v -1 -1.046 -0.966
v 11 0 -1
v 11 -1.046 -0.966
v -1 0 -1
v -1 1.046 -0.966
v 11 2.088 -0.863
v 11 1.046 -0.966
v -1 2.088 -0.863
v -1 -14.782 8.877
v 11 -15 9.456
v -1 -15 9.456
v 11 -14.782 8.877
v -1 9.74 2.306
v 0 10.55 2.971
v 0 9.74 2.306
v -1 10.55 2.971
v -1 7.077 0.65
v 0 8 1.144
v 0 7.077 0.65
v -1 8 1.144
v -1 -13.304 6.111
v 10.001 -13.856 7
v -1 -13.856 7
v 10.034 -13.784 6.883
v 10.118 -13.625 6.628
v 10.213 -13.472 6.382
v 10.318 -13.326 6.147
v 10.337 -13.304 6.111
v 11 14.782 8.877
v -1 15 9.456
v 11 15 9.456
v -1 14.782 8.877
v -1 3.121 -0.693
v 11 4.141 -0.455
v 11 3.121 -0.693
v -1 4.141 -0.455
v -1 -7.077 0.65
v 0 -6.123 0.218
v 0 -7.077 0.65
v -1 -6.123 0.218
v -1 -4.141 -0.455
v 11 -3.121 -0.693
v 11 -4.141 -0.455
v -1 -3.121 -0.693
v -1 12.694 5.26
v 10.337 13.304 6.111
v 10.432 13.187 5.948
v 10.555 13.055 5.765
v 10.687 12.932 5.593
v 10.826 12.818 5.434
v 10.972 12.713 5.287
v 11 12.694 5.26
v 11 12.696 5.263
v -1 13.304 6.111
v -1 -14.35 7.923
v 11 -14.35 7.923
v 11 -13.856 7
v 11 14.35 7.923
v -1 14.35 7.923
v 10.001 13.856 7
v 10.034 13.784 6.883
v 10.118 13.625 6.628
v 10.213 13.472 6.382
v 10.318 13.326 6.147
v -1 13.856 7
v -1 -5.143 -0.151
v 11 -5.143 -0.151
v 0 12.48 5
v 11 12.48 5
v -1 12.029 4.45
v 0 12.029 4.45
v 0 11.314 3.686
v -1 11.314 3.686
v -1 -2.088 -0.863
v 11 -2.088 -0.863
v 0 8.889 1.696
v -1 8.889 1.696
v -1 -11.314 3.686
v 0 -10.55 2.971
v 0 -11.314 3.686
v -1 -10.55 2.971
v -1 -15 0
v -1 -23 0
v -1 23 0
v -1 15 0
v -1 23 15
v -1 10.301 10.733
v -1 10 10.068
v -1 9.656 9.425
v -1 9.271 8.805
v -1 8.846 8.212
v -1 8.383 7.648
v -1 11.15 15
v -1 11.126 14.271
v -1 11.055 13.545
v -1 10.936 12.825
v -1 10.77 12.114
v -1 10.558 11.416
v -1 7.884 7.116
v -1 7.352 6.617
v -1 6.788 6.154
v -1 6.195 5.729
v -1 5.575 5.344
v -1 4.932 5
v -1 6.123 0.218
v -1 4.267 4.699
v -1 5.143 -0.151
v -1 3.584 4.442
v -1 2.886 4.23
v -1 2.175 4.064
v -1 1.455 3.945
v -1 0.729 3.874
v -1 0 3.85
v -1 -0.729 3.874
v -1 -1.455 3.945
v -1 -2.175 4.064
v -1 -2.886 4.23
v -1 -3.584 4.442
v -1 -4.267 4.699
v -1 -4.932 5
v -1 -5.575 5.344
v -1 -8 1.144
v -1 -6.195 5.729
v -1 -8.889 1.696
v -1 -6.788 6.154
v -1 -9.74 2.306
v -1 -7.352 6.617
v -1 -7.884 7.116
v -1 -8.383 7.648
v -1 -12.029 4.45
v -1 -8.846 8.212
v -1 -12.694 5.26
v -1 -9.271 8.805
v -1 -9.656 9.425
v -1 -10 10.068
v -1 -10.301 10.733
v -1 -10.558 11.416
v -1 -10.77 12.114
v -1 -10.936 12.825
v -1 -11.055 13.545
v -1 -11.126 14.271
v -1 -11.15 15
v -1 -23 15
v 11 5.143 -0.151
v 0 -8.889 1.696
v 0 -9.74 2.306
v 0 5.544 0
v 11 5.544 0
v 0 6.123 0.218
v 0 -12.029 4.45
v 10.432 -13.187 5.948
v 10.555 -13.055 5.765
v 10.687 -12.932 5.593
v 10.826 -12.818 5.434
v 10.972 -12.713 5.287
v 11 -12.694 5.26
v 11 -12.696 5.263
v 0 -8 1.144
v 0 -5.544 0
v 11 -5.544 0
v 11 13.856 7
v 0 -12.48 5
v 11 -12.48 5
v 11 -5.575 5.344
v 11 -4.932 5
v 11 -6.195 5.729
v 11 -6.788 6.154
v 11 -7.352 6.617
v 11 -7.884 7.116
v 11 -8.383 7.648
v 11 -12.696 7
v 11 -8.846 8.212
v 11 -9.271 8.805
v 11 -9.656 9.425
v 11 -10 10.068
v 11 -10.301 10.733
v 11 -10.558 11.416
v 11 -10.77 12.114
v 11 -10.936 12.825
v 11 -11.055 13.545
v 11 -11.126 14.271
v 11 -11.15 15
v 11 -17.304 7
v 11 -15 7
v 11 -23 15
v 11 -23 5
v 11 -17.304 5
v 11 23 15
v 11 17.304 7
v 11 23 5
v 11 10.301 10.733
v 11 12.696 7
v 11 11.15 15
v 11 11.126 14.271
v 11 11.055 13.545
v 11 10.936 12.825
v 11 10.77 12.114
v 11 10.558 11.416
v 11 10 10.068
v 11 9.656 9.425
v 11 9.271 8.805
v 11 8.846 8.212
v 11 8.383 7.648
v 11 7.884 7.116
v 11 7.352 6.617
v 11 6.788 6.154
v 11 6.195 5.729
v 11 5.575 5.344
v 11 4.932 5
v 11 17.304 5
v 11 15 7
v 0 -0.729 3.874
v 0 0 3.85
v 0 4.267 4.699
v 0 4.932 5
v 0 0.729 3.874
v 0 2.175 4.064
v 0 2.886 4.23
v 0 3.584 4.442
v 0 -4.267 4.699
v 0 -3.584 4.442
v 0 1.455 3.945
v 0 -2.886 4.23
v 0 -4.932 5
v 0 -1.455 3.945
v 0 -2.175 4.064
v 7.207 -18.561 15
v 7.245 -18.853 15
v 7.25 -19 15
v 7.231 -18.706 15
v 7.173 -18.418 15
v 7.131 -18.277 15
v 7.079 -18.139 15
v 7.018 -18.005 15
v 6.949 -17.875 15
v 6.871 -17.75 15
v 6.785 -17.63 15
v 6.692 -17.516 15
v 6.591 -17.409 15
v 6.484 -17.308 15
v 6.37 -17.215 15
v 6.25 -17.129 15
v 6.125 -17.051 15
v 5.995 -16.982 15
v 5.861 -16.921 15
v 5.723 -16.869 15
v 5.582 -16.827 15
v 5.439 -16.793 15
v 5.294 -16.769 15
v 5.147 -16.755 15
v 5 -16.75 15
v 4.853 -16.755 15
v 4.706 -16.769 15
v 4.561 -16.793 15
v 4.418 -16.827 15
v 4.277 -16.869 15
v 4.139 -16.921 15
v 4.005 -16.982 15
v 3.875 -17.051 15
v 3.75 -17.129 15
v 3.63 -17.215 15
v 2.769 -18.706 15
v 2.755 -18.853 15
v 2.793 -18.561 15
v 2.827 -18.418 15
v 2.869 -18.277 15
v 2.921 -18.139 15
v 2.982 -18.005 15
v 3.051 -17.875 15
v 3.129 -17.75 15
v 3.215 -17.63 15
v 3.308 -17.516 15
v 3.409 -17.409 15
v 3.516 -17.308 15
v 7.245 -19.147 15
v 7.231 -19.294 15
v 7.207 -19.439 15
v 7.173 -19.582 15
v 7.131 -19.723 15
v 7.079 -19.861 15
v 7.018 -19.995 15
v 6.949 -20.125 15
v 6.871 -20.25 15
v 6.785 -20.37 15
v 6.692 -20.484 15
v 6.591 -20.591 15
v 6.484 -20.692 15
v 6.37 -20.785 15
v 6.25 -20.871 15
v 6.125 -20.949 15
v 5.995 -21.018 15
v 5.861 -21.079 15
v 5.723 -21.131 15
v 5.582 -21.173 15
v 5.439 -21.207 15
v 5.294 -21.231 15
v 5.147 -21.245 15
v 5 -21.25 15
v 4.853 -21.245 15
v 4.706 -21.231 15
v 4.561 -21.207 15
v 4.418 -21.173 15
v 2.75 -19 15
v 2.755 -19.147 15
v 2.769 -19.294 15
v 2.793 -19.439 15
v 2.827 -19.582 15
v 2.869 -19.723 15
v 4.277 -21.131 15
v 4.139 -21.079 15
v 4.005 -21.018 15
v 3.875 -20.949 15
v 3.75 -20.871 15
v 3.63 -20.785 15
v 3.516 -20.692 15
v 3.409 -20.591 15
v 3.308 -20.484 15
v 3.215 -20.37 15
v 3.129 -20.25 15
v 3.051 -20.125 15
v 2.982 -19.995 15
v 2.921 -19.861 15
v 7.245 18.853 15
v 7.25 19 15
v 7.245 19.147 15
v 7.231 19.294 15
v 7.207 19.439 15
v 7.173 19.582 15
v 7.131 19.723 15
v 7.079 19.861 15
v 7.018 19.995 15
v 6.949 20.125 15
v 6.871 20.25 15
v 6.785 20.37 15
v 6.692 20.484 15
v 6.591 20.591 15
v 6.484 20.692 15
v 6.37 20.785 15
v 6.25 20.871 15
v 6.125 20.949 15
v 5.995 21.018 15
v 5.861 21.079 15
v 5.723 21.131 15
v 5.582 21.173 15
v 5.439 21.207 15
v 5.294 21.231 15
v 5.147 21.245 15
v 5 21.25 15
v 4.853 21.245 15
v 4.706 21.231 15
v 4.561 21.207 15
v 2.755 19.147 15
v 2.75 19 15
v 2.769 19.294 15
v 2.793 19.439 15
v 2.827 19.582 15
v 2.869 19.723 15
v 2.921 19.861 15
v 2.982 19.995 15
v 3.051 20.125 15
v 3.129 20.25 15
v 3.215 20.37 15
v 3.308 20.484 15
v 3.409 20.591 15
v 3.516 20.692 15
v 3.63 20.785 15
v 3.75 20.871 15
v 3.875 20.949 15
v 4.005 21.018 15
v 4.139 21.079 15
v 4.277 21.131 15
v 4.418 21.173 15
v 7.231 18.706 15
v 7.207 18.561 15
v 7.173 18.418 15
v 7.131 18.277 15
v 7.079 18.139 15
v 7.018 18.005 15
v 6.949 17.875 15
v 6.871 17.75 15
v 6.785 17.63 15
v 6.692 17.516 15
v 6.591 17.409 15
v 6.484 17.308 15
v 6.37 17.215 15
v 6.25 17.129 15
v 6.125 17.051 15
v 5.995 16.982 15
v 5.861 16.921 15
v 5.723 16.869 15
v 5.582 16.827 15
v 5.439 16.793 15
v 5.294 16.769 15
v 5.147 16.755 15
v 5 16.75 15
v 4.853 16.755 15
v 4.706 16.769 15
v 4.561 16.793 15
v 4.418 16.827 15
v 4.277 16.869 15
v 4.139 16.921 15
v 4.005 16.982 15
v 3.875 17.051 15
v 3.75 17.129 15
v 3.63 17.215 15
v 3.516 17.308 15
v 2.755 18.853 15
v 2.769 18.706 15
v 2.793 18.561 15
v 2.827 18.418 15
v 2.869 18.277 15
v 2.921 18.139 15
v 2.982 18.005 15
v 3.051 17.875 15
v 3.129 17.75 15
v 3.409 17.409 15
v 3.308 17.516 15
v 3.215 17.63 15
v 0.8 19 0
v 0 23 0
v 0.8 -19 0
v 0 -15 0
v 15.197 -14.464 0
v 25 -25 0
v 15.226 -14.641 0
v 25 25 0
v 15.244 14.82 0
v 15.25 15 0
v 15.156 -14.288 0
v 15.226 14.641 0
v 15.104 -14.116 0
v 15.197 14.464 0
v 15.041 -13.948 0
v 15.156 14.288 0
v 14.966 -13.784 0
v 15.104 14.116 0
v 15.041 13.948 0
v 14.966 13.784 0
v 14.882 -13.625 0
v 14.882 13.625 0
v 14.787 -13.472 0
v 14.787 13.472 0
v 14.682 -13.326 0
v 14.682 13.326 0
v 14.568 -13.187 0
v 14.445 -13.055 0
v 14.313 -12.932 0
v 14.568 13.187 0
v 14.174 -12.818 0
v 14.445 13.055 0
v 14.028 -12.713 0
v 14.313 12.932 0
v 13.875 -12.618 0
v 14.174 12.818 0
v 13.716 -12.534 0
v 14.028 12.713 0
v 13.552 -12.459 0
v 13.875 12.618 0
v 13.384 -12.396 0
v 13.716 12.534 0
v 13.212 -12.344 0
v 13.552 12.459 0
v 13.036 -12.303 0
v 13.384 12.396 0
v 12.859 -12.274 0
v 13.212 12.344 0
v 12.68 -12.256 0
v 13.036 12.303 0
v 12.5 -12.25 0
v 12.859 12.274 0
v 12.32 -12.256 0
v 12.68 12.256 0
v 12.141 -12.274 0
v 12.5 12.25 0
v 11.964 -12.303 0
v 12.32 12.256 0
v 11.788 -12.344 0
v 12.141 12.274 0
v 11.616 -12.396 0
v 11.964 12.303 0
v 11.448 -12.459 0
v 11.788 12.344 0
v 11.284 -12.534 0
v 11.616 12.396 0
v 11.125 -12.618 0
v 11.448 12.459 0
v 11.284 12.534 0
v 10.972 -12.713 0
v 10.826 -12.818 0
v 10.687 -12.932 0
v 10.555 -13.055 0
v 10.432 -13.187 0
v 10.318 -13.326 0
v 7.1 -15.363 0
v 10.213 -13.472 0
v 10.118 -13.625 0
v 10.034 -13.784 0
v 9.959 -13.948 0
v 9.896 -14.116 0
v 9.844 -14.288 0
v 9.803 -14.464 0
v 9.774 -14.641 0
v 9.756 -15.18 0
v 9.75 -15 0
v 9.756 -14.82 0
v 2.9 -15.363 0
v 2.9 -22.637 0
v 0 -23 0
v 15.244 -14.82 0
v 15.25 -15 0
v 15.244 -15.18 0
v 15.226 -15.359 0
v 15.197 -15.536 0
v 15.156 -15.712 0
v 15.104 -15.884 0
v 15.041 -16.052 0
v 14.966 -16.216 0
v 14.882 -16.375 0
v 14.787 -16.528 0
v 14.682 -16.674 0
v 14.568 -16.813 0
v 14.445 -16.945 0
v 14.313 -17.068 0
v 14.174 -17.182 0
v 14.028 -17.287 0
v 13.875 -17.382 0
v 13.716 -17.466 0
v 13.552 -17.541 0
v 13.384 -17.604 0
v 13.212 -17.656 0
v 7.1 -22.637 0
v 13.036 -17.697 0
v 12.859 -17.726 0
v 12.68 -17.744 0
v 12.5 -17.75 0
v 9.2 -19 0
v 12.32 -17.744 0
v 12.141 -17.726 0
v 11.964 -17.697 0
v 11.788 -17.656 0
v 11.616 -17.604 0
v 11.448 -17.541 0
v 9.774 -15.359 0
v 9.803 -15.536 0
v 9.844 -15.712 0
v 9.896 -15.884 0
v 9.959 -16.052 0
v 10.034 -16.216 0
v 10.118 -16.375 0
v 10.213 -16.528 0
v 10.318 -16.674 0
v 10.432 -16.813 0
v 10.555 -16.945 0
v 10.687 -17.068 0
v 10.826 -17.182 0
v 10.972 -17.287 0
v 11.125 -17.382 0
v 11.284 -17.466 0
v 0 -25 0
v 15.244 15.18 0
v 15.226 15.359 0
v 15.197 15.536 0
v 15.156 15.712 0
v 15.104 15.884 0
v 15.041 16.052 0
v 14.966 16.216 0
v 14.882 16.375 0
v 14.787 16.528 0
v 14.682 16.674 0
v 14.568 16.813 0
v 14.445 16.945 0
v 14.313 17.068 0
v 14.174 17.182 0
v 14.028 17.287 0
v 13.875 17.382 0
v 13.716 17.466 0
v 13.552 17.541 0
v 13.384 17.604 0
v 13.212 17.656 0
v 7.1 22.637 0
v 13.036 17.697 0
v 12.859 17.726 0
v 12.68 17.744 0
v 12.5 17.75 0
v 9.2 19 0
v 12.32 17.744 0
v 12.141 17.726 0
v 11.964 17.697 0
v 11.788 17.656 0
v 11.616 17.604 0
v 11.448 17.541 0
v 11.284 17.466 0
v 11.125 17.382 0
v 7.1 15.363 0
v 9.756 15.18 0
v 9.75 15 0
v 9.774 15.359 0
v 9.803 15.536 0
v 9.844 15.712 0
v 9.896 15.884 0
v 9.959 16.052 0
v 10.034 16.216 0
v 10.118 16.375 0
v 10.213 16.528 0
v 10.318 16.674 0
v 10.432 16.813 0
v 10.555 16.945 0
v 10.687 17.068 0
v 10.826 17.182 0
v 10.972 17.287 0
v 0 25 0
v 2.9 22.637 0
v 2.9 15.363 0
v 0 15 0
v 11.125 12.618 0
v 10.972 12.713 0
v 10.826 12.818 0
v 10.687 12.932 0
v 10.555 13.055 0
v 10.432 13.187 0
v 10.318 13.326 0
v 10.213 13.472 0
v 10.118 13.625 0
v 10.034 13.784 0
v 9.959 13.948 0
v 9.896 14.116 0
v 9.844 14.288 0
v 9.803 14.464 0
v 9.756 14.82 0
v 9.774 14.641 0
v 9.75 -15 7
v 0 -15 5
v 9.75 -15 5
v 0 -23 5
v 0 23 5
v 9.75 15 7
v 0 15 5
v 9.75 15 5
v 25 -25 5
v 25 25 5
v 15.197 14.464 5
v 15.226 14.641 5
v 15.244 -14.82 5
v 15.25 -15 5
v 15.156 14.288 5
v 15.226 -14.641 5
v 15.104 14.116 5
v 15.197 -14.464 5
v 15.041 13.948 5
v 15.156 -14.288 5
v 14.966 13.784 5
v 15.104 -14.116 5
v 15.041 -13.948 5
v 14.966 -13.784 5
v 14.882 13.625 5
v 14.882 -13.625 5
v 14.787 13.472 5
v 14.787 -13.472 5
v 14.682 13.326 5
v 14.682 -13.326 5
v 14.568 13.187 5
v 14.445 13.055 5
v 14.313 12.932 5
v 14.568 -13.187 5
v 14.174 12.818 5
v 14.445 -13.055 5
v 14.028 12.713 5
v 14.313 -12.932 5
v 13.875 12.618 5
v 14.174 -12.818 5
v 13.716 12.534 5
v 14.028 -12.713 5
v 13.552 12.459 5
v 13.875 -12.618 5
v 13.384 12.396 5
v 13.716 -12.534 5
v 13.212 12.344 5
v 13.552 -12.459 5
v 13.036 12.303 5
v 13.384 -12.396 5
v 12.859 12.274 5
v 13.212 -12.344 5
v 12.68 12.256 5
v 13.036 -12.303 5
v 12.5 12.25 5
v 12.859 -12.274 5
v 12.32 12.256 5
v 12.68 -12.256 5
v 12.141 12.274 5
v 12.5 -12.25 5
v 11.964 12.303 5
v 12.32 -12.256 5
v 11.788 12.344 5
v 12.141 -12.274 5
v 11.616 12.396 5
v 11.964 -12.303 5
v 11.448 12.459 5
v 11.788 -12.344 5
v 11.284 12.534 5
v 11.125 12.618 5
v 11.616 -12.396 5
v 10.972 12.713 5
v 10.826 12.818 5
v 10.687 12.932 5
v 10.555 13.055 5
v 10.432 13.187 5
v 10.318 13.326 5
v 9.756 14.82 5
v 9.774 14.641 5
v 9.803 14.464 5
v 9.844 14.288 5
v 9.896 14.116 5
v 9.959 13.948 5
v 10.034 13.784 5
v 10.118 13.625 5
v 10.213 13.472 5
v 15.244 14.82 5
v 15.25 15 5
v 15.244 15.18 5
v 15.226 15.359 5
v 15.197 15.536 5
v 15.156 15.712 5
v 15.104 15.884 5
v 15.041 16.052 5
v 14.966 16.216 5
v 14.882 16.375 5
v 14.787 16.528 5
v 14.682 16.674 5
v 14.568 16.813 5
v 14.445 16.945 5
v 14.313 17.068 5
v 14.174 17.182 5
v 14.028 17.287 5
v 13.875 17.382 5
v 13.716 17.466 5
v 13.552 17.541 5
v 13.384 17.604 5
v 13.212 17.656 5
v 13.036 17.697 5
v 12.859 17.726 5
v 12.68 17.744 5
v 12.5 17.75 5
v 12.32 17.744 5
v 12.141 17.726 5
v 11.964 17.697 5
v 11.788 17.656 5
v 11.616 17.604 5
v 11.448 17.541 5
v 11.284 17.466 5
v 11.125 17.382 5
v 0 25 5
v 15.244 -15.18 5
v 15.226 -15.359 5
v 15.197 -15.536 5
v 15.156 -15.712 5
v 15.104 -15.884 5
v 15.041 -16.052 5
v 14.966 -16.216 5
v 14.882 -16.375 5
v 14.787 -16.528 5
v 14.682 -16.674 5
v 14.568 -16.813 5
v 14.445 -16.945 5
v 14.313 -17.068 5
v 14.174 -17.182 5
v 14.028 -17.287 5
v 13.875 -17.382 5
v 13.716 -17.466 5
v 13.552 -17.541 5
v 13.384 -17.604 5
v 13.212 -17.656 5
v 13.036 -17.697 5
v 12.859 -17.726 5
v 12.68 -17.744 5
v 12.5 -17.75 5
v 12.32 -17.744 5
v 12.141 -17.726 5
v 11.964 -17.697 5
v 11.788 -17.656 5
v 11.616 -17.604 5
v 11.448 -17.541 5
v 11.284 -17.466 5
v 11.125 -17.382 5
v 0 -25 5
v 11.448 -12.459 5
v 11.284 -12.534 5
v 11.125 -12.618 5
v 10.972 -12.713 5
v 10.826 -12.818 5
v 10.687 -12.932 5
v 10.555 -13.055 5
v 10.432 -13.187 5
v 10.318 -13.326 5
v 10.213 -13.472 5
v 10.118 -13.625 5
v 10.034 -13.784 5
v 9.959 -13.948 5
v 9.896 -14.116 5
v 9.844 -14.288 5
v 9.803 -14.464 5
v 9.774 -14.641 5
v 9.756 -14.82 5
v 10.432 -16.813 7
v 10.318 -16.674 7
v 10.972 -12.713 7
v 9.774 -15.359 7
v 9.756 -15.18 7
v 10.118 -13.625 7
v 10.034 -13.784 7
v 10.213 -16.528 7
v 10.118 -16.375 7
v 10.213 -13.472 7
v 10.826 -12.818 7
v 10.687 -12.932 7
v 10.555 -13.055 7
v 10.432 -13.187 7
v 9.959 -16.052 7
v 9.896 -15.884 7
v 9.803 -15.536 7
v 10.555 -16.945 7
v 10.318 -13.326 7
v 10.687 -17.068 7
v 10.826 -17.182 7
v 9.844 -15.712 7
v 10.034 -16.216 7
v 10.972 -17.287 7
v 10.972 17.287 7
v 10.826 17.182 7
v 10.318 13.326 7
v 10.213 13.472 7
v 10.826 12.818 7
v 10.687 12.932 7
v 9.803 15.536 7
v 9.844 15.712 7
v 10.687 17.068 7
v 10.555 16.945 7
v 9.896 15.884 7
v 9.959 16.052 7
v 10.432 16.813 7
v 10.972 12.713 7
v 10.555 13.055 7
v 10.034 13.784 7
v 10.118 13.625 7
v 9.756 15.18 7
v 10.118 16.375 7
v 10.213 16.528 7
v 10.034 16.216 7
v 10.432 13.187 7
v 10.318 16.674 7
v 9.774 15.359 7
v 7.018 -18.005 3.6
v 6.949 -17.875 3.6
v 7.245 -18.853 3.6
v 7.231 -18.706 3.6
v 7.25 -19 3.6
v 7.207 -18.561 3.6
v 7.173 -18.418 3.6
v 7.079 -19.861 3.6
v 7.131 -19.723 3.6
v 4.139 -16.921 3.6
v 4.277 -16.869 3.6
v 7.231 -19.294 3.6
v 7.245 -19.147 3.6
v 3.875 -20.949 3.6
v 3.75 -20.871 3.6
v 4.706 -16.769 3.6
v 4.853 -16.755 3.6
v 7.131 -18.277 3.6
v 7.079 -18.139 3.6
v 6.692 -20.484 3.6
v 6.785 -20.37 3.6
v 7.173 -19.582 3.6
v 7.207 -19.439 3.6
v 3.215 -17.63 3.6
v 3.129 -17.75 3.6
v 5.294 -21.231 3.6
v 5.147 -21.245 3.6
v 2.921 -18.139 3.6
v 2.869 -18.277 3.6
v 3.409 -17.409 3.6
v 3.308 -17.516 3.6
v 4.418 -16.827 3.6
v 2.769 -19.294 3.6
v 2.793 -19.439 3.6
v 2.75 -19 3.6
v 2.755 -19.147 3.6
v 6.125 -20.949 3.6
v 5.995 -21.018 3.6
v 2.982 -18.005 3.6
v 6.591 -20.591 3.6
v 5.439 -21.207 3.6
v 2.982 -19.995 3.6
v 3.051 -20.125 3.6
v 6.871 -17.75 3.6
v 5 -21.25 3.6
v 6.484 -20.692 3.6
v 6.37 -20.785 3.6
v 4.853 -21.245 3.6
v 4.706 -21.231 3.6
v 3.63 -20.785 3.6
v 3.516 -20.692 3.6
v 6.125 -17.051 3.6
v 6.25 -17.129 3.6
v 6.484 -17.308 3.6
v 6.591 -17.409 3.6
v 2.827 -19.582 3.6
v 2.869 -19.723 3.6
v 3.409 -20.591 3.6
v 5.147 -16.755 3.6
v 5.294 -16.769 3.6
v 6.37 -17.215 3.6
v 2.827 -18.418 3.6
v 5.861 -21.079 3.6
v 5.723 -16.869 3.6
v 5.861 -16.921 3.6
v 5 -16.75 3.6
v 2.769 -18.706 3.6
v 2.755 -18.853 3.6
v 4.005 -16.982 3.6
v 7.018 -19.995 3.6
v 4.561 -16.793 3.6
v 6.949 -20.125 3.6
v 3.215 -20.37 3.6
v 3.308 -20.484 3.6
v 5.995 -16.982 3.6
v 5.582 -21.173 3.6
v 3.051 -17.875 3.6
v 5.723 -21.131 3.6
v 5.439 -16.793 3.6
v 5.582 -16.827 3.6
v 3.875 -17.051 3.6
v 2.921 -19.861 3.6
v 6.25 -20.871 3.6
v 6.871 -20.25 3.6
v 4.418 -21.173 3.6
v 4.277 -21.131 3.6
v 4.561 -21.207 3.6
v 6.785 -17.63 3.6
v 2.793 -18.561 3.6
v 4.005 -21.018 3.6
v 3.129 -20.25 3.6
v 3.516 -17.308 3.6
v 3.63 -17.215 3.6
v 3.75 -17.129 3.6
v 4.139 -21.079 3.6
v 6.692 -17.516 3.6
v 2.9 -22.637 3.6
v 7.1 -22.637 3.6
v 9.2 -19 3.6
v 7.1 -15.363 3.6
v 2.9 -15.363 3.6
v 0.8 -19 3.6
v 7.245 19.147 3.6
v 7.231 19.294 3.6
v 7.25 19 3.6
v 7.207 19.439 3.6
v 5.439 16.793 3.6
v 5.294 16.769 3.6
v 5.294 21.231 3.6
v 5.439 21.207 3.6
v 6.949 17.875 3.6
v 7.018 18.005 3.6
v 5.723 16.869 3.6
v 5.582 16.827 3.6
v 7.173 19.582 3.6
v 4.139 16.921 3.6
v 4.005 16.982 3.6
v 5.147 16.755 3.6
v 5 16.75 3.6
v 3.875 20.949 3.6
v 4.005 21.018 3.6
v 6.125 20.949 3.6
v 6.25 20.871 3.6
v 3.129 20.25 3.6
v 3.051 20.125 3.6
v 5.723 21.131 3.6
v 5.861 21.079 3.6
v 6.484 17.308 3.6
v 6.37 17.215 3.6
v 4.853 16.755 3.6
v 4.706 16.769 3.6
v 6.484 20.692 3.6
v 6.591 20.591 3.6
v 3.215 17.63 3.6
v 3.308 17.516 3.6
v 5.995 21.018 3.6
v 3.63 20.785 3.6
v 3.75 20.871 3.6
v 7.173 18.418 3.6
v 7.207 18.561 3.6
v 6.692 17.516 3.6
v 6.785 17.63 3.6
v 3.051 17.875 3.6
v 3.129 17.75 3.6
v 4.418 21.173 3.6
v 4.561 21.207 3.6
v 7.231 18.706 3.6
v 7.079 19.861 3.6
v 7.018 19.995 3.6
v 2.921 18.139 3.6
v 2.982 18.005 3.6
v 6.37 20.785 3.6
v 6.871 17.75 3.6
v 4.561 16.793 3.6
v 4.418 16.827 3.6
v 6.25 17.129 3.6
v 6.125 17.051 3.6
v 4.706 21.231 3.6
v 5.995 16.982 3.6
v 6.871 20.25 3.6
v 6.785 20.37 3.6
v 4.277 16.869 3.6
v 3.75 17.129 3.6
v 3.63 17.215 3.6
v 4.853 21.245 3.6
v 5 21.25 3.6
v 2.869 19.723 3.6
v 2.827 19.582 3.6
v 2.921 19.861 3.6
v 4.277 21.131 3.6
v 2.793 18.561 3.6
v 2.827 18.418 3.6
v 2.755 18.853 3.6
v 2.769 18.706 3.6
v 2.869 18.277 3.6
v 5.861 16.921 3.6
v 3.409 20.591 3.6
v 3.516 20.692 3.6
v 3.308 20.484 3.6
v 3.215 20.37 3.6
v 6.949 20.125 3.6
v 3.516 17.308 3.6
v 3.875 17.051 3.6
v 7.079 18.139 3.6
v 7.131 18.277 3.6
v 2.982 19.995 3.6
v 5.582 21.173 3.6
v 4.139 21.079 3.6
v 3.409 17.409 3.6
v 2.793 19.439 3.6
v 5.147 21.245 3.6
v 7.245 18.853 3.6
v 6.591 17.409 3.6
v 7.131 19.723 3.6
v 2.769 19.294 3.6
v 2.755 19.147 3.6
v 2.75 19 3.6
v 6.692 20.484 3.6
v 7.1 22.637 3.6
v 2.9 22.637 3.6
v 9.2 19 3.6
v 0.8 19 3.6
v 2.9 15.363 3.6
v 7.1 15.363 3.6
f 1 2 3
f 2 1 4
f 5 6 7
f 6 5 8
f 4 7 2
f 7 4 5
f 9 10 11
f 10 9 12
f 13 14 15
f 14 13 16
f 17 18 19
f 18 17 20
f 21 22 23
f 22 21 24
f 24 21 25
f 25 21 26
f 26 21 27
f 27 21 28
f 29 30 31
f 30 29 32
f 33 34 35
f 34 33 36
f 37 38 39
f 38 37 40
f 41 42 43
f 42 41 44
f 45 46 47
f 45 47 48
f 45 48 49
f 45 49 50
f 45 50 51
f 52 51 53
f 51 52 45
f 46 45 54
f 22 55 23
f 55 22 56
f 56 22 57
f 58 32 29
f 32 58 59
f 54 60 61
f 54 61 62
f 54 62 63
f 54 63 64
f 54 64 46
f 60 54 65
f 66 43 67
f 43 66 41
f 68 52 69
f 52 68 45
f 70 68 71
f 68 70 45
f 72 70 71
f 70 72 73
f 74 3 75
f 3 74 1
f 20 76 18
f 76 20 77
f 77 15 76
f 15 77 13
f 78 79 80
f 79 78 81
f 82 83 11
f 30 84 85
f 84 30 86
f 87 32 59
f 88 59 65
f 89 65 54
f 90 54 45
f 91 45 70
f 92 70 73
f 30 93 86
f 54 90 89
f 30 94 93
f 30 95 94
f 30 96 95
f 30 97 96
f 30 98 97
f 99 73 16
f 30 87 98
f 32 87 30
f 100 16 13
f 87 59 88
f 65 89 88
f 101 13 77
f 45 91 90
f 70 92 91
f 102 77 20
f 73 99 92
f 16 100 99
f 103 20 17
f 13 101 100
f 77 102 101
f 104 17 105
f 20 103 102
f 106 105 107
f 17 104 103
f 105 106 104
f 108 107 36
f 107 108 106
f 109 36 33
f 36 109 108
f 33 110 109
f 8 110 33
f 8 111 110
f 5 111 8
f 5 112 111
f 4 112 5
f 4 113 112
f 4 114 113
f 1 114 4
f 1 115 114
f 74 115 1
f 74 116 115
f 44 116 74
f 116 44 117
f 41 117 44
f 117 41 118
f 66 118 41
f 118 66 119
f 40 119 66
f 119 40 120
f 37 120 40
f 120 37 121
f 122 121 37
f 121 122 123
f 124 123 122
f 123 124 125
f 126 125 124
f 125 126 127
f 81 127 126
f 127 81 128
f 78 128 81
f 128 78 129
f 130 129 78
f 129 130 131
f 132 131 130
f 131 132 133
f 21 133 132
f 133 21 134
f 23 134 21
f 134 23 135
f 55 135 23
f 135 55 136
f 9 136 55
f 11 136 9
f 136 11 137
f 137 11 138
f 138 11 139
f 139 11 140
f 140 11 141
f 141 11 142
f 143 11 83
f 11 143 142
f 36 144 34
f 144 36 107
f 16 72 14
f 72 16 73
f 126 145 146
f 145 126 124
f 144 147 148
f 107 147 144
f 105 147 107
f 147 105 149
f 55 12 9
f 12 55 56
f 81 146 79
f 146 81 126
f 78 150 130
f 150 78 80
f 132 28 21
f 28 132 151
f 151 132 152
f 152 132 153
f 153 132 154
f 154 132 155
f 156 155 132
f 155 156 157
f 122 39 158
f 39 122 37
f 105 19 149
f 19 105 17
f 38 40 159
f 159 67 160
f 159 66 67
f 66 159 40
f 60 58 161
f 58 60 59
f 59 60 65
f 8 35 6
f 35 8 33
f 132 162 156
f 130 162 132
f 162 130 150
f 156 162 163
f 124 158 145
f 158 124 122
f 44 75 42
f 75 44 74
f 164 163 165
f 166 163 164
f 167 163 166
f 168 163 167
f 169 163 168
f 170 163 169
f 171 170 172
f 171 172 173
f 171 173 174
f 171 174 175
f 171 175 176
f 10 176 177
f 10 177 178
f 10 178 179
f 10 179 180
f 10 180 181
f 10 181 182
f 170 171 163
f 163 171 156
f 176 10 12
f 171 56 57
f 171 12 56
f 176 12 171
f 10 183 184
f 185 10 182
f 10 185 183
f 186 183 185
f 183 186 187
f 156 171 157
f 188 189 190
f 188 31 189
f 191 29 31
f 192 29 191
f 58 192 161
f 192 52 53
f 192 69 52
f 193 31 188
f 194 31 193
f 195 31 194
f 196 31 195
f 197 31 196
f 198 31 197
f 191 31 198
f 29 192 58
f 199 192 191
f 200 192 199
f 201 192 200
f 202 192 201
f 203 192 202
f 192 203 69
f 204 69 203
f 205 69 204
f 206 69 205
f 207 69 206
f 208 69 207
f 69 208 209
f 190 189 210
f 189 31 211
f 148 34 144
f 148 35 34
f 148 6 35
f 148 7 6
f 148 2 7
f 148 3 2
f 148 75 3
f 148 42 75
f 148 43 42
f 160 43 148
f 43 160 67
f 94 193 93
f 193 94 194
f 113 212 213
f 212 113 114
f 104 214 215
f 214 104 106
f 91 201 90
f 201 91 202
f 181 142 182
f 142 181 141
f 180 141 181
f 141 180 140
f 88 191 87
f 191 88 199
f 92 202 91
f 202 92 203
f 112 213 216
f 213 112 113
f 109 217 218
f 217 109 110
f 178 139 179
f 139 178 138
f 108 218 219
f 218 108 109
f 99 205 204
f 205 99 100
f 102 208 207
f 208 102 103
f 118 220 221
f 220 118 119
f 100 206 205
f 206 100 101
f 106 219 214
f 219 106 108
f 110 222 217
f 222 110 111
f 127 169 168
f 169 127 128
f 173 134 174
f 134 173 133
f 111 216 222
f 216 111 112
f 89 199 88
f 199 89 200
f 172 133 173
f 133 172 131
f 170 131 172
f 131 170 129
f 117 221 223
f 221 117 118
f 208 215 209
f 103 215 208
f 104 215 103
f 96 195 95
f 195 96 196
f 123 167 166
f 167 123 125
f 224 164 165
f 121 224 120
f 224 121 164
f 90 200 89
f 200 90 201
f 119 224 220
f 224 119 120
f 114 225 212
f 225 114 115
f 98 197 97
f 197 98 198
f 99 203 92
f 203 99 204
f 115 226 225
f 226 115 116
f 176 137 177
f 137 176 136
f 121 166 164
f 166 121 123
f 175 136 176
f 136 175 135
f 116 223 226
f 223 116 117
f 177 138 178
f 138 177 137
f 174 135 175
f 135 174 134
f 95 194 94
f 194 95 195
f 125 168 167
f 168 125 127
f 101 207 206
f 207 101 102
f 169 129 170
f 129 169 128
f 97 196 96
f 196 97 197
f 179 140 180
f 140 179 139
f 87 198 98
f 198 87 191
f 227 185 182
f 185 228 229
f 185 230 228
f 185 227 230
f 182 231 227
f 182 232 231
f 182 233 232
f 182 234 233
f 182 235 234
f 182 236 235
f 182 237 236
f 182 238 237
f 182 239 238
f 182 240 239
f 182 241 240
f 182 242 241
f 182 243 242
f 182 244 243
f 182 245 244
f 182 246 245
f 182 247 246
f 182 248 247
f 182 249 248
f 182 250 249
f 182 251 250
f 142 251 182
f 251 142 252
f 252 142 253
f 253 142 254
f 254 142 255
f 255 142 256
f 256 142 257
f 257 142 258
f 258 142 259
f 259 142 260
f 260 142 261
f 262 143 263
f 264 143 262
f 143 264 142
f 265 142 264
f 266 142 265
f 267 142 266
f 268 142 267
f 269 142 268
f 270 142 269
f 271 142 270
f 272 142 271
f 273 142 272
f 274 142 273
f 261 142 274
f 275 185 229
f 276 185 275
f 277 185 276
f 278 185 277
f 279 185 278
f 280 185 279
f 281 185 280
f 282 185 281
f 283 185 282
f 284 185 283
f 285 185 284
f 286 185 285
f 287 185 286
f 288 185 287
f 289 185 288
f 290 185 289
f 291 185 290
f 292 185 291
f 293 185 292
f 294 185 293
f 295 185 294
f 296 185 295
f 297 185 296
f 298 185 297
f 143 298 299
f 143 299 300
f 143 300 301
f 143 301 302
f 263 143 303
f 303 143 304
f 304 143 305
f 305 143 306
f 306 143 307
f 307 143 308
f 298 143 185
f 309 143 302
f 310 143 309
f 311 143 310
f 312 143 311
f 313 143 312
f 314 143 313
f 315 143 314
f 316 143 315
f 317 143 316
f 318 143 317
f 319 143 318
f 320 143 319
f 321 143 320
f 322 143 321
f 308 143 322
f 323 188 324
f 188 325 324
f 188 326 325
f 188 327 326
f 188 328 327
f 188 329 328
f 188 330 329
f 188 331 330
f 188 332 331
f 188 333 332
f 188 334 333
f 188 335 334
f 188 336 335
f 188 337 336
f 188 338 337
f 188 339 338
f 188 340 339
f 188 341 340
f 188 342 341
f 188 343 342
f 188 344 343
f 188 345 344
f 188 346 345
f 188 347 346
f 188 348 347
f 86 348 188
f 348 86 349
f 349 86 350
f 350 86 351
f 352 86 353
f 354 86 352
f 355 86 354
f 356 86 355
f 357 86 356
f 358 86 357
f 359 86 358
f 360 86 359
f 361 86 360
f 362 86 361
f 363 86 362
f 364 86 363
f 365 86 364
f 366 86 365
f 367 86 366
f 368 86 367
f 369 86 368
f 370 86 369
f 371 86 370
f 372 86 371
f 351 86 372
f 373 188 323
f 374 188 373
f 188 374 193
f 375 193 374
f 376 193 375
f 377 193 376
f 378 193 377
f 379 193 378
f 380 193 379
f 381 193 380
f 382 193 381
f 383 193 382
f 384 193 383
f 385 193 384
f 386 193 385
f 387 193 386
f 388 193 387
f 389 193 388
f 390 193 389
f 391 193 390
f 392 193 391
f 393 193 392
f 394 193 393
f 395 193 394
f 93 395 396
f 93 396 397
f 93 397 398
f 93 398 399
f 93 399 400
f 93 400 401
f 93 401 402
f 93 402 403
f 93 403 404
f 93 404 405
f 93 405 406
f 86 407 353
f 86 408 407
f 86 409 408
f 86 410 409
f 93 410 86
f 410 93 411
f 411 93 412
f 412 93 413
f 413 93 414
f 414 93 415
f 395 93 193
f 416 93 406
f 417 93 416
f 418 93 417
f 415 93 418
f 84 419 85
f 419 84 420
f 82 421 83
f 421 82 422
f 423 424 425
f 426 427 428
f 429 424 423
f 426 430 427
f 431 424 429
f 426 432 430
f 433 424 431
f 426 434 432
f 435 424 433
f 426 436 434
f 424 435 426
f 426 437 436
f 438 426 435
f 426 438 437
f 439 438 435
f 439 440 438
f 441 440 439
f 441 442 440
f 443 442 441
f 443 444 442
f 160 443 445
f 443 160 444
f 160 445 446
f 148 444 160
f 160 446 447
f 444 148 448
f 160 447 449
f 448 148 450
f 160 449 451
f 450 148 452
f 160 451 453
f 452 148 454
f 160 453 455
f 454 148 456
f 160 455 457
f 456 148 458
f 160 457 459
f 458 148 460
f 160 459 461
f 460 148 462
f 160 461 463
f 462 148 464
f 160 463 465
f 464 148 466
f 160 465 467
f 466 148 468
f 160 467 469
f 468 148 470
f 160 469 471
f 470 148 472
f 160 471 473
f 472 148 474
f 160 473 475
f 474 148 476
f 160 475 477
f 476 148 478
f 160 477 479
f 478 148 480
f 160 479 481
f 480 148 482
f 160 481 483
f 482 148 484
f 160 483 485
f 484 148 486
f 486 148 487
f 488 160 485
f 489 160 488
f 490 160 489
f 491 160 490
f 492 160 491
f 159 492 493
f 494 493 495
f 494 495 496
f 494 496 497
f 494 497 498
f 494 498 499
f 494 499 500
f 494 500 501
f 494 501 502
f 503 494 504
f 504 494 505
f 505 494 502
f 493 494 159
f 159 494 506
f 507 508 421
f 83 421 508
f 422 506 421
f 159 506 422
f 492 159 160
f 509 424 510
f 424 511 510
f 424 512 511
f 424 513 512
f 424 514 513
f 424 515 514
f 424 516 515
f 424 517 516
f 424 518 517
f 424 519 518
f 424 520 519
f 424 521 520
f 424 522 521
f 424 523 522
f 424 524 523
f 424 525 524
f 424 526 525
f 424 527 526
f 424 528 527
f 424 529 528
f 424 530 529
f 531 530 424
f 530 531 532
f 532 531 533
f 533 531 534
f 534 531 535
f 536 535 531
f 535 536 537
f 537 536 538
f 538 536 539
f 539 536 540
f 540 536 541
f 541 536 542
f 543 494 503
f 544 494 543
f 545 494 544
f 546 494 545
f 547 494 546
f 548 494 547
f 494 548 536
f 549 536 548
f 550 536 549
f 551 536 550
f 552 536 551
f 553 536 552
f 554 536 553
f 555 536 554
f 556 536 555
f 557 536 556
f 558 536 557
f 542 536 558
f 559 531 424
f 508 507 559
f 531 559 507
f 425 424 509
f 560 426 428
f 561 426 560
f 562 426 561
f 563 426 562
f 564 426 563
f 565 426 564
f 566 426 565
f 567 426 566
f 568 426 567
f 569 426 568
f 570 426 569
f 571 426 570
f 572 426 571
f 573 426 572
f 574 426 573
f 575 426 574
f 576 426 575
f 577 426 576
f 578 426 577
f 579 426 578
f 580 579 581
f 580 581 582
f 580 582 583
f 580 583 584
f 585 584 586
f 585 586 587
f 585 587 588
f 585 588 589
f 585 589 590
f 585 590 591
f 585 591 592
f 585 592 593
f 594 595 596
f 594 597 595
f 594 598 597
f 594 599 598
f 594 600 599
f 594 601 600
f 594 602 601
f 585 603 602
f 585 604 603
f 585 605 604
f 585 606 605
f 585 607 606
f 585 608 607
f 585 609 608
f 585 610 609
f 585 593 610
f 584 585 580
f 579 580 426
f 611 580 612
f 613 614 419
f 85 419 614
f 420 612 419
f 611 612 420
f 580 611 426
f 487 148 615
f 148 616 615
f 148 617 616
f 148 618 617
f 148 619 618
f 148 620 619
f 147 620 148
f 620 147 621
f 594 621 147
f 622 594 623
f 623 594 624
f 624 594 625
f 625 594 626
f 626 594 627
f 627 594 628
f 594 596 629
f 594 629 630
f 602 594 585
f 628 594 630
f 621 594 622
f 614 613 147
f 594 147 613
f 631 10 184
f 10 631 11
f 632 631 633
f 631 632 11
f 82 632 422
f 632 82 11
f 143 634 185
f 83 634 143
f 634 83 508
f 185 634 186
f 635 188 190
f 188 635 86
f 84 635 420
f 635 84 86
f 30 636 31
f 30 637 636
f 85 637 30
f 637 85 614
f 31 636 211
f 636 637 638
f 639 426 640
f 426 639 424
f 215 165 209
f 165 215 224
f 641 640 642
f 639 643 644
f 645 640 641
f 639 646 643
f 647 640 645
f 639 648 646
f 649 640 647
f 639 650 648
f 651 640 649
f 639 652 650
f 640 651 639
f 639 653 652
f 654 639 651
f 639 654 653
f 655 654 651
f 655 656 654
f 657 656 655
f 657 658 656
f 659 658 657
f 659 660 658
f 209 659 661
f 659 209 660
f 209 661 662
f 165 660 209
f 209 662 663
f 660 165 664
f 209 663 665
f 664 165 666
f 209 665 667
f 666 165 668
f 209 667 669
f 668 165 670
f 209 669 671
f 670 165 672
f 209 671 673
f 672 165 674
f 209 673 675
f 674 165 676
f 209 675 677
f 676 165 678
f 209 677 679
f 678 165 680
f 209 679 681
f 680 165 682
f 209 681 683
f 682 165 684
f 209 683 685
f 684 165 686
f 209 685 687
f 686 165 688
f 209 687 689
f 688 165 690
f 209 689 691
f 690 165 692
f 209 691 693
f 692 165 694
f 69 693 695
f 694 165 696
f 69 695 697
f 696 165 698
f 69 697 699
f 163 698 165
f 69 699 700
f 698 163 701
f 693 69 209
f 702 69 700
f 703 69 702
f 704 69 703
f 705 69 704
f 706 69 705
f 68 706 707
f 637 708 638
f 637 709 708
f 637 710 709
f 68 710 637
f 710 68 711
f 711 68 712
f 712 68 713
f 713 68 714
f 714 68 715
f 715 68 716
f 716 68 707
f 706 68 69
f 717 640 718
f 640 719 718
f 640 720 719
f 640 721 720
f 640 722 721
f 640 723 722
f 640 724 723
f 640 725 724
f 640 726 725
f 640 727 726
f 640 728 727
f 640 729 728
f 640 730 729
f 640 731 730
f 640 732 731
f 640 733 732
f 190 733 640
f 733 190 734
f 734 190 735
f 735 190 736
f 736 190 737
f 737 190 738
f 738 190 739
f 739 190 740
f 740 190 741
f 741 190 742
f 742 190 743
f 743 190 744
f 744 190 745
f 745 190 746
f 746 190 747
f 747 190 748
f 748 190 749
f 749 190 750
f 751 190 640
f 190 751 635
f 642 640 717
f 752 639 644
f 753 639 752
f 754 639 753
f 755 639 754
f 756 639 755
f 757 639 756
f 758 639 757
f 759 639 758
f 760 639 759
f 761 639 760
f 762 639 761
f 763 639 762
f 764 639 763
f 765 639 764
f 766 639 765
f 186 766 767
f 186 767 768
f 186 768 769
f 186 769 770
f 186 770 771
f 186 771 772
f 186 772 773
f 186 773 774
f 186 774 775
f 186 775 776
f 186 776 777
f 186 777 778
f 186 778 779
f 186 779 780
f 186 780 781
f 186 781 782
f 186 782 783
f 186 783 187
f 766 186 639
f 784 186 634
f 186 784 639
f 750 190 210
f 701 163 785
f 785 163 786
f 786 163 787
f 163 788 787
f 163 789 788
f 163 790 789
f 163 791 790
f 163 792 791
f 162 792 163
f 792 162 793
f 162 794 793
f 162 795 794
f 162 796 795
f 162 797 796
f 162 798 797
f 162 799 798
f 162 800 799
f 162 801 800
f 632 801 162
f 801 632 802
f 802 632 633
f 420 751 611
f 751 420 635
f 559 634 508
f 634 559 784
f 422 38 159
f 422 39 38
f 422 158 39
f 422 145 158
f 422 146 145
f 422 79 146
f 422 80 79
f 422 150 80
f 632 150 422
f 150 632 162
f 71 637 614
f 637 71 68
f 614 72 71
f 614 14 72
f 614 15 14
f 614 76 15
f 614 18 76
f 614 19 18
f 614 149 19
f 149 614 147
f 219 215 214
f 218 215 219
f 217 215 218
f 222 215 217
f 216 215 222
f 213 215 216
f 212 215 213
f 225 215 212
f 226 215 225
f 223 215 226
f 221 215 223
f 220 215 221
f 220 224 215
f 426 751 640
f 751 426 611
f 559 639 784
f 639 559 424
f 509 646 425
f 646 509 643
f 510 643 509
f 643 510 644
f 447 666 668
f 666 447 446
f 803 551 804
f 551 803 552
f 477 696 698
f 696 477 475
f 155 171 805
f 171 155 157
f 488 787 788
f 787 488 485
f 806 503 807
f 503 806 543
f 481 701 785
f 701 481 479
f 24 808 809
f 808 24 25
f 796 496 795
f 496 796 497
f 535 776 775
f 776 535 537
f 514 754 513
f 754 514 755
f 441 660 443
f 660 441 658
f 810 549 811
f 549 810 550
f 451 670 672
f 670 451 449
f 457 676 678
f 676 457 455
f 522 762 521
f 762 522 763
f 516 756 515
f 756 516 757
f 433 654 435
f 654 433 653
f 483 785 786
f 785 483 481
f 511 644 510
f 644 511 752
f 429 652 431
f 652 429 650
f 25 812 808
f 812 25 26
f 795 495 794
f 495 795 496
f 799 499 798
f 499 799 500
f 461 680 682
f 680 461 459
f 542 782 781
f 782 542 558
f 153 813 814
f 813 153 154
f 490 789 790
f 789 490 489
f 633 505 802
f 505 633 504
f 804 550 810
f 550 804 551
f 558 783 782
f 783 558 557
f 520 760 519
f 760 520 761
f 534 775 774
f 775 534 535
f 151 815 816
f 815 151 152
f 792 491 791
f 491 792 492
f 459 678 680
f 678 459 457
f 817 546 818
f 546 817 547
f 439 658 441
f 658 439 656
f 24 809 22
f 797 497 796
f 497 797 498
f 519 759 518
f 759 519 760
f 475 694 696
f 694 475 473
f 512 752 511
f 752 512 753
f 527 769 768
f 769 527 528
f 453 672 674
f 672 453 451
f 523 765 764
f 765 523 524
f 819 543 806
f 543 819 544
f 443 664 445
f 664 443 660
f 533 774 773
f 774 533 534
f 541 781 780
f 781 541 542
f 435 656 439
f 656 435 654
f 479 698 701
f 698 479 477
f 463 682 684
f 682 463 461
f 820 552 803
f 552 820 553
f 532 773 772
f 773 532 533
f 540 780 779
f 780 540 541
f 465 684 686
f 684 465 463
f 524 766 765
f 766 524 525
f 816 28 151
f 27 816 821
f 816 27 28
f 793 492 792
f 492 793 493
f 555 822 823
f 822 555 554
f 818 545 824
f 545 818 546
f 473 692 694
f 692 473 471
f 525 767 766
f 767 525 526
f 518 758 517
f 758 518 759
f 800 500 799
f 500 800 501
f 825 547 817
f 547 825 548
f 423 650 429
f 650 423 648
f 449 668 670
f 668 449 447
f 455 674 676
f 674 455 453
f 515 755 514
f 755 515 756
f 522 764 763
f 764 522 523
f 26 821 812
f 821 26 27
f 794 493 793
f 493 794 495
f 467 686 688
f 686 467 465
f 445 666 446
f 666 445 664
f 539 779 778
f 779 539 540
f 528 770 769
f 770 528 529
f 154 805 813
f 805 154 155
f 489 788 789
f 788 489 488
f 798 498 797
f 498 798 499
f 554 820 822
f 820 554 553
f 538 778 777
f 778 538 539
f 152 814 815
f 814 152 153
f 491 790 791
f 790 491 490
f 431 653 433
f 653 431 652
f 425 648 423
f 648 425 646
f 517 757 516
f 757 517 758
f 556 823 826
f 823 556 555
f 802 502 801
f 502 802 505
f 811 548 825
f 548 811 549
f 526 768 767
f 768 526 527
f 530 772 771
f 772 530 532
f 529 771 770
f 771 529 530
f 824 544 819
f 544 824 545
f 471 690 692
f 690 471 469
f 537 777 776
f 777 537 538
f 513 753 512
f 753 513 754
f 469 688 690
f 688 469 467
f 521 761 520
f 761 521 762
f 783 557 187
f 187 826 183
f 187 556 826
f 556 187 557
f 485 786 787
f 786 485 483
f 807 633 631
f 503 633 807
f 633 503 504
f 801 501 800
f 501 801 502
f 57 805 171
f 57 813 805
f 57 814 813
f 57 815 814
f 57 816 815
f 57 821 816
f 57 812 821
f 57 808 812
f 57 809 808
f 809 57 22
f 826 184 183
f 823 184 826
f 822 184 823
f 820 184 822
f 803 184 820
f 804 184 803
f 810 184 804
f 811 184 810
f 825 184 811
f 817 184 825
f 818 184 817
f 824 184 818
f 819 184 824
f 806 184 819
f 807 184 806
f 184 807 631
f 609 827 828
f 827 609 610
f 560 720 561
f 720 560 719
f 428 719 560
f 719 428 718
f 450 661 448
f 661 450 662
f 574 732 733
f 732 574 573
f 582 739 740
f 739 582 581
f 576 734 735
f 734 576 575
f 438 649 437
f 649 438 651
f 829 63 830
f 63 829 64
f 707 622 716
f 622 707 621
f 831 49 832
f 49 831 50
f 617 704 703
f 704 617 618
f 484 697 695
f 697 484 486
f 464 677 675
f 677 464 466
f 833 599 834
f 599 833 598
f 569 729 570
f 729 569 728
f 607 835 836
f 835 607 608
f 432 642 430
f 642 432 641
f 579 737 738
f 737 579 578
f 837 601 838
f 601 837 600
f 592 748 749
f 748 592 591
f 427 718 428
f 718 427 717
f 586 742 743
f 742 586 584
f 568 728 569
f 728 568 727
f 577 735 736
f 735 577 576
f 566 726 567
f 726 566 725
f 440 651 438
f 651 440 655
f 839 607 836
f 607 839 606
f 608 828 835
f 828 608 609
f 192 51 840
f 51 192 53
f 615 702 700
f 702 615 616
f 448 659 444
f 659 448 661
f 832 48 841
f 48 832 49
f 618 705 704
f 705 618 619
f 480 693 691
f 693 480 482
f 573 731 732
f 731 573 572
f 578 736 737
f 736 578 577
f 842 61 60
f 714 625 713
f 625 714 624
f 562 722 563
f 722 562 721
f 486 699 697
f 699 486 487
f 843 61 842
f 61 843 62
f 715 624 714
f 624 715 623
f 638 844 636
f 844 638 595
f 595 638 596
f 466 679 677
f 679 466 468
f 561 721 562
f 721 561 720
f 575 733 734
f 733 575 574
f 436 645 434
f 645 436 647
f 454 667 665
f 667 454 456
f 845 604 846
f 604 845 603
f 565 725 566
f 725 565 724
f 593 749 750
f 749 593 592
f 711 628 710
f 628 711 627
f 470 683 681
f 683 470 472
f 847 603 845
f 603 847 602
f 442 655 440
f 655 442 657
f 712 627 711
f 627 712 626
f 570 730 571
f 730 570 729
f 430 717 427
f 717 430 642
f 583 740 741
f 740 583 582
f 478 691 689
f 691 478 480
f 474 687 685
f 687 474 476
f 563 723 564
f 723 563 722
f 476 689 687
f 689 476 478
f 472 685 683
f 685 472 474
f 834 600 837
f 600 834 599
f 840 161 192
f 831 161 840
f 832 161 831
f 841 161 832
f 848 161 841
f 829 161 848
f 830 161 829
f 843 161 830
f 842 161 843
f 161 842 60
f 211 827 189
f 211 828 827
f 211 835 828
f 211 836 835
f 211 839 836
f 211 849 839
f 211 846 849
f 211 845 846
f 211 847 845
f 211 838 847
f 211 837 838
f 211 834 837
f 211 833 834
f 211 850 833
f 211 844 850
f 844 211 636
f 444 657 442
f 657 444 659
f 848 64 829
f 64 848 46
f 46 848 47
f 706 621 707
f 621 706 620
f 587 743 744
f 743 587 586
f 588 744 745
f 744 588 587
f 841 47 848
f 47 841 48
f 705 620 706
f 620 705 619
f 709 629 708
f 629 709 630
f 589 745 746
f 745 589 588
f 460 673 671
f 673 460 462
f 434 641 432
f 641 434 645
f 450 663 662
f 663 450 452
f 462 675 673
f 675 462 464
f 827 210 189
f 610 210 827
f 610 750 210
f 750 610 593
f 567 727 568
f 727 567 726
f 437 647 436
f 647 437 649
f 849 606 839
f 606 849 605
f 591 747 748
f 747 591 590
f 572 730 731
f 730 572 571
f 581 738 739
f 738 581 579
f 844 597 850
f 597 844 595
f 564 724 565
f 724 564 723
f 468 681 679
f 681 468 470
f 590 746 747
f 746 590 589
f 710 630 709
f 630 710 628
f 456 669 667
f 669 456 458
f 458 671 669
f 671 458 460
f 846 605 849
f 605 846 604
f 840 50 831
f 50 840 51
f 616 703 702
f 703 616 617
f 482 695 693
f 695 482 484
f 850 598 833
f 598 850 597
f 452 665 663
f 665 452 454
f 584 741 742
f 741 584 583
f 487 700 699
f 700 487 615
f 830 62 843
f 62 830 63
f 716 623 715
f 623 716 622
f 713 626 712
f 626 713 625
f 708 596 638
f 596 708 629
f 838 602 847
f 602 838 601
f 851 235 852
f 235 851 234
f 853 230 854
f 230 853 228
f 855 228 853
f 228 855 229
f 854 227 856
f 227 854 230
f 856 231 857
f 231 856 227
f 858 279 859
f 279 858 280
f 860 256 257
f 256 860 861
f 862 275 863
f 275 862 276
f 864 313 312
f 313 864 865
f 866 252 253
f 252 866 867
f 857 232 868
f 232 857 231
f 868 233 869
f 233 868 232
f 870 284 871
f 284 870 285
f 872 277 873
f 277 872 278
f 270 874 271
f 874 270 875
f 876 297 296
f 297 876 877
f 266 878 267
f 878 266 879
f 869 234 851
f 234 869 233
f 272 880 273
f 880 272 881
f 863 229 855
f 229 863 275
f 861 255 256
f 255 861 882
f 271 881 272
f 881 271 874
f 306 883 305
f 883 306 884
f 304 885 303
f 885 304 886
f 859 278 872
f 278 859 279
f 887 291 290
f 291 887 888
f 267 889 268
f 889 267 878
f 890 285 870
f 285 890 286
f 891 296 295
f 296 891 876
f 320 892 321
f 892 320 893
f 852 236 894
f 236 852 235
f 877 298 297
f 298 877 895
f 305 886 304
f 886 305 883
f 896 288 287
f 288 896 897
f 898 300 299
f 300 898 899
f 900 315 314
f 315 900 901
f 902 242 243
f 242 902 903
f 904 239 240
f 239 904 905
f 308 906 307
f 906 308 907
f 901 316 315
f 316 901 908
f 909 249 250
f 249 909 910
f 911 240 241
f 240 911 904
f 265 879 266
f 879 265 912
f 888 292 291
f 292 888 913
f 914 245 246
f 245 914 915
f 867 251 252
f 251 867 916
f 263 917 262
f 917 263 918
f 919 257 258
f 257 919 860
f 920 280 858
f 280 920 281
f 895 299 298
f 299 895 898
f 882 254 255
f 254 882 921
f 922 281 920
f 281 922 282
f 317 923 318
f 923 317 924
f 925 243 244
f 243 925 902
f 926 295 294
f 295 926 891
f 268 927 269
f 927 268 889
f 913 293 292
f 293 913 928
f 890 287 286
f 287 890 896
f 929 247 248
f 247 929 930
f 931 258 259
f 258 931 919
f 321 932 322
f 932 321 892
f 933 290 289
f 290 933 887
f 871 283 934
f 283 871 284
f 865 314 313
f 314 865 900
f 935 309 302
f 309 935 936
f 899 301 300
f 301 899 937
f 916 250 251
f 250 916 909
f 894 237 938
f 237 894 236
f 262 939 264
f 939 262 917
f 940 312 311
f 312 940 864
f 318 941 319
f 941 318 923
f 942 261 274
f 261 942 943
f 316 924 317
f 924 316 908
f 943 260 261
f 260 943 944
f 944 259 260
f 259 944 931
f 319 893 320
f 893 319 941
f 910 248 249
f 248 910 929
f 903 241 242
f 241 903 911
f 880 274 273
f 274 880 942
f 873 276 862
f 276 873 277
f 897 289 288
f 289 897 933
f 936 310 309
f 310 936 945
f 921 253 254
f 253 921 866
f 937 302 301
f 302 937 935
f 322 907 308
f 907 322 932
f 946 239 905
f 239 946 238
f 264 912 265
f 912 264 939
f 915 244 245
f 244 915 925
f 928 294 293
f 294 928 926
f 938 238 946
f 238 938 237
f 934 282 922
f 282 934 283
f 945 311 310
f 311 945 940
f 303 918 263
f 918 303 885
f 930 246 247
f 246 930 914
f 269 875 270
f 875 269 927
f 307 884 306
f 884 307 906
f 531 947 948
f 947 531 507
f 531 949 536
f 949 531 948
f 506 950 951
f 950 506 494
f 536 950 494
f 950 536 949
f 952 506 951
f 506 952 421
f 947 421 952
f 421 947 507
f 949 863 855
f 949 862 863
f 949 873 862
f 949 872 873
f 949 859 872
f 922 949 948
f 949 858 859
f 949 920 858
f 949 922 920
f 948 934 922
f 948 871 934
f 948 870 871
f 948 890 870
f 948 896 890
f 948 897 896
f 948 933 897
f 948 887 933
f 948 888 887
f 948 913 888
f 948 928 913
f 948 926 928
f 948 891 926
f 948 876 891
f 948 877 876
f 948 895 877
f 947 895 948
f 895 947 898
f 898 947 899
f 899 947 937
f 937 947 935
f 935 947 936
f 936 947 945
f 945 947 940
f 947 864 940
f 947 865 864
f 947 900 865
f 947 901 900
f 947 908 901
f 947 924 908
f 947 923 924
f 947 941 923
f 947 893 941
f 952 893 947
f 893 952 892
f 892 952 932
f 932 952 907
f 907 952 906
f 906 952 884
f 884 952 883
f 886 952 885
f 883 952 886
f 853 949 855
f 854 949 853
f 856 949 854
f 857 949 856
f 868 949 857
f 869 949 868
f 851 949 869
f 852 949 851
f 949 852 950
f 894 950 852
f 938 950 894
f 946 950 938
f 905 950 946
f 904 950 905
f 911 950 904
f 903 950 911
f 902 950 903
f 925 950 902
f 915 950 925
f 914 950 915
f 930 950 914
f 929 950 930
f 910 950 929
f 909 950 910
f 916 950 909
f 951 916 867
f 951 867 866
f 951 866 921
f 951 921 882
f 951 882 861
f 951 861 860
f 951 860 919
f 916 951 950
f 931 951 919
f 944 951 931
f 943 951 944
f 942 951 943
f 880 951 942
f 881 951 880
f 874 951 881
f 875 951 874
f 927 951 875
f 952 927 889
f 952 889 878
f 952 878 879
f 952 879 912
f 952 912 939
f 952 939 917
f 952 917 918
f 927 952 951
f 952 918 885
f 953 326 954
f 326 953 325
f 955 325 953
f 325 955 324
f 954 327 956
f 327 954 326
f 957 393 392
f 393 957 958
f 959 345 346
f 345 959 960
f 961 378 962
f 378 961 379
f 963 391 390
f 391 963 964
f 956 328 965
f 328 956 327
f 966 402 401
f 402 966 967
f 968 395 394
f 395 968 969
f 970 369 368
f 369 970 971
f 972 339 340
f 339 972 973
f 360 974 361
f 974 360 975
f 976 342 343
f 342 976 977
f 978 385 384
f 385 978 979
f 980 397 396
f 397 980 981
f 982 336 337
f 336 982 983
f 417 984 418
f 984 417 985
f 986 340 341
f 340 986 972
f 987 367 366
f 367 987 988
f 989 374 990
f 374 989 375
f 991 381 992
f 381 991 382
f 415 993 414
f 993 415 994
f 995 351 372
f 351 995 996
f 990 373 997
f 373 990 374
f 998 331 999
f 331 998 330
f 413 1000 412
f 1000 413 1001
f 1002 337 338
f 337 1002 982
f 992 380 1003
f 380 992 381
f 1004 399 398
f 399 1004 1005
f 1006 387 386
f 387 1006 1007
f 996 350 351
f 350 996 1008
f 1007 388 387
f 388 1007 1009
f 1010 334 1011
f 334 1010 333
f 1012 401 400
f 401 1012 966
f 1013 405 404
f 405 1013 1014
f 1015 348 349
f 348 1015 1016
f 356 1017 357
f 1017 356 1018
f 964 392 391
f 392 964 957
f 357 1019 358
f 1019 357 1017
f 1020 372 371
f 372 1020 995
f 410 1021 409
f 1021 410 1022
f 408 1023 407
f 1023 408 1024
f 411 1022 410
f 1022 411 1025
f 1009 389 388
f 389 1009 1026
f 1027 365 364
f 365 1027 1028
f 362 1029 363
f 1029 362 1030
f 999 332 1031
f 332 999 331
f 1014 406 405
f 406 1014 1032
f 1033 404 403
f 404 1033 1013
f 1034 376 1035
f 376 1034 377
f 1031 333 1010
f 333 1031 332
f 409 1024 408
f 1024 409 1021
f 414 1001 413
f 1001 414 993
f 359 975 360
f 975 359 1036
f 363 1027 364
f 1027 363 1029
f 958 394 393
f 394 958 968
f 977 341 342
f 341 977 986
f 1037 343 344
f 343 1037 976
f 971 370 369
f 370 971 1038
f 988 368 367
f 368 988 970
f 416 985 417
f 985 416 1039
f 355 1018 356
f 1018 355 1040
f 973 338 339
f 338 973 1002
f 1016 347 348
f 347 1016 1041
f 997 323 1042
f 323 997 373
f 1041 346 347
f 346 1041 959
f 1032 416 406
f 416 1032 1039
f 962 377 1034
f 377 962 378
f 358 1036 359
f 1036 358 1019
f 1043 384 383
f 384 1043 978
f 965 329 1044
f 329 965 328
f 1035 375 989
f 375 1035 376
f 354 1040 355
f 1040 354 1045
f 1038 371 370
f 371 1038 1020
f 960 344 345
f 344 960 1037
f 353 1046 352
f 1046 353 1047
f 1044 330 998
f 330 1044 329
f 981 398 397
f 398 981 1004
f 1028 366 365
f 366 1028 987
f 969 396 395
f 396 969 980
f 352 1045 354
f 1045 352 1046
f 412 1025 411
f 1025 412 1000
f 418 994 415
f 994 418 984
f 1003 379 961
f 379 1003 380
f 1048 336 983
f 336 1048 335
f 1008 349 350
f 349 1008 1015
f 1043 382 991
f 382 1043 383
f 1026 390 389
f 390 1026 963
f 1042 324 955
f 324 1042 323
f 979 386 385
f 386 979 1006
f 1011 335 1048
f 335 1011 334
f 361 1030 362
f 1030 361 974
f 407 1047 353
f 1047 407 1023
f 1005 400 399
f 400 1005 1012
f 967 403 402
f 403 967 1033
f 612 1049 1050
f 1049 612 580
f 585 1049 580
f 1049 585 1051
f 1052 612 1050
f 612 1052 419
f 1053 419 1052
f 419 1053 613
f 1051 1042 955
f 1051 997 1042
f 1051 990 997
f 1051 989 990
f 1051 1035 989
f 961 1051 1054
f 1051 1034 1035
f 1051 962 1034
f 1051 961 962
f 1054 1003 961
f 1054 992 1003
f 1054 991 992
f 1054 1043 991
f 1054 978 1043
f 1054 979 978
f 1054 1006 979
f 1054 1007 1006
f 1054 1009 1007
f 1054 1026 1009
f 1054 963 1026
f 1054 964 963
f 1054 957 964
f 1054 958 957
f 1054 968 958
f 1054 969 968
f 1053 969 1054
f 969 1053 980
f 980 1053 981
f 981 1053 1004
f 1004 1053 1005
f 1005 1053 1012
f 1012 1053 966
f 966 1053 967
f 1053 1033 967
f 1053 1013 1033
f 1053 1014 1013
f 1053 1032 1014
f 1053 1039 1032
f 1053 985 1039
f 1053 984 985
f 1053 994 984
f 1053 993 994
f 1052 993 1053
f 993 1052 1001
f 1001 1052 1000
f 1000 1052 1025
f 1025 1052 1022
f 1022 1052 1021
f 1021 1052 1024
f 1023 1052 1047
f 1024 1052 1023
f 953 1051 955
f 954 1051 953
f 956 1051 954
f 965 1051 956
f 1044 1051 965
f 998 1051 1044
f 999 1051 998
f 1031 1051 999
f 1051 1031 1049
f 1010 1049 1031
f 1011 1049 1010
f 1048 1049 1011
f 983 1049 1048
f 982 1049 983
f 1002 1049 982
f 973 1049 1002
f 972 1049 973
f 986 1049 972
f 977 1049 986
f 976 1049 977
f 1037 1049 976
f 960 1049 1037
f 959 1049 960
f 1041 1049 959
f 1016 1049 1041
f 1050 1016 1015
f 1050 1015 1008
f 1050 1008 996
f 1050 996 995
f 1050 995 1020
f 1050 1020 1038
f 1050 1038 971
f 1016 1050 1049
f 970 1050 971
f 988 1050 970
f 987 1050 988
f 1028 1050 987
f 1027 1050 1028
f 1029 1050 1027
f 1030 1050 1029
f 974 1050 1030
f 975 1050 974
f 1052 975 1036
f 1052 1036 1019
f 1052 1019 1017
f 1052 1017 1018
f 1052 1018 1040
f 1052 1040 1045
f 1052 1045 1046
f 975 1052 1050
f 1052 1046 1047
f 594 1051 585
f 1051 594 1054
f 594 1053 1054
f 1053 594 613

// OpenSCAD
// Space Why? inner-gimbal completion parts
// Units: mm. Prototype fit/motion hardware only; not validated for live-fire loads.
// Select a part at the bottom and render/export it in OpenSCAD.

$fn = 96;

module slot2d(len, dia) {
    hull() {
        translate([-len/2,0]) circle(d=dia);
        translate([ len/2,0]) circle(d=dia);
    }
}

// Split pillow block for one 608 bearing. Its M5 base holes match one
// outer-ring seam; bearing center is 15 mm above the ring face so it aligns
// with an existing pivot_shaft_lug placed directly on the inner-ring face.
module inner_axis_bearing_pedestal_base() {
    difference() {
        union() {
            translate([0,-25,0]) cube([25,50,5]);
            intersection() {
                translate([5,0,15]) rotate([0,90,0])
                    difference() {
                        cylinder(h=12,d=32,center=true);
                        cylinder(h=14,d=22.3,center=true);
                    }
                translate([-10,-35,-17]) cube([30,70,32]);
            }
            for (y=[-19,19]) translate([-1,y-4,0]) cube([12,8,15]);
        }
        for (y=[-15,15]) translate([12.5,y,-2]) cylinder(h=9,d=5.5);
        for (y=[-19,19]) {
            translate([5,y,-1]) cylinder(h=18,d=4.5);
            translate([5,y,0]) cylinder(h=3.6,r=4.2,$fn=6);
        }
    }
}

module inner_axis_bearing_pedestal_cap() {
    difference() {
        union() {
            intersection() {
                translate([5,0,15]) rotate([0,90,0])
                    difference() {
                        cylinder(h=12,d=32,center=true);
                        cylinder(h=14,d=22.3,center=true);
                    }
                translate([-10,-35,15]) cube([30,70,32]);
            }
            for (y=[-19,19]) translate([-1,y-4,15]) cube([12,8,12]);
        }
        for (y=[-19,19]) translate([5,y,12]) cylinder(h=20,d=4.5);
    }
}

// Two identical plates: one above and one below the inner ring.
// The left/right notches keep the existing pivot lugs directly on the ring.
module inner_ring_clamp_carrier_plate() {
    delta = 15/75*180/PI;
    difference() {
        cylinder(h=5,d=170,center=true);
        cylinder(h=7,d=82,center=true);
        for (x=[-74,74]) translate([x,0,0]) cube([32,56,9],center=true);
        for (a=[45,135,225,315])
            translate([46.25*cos(a),46.25*sin(a),-5]) cylinder(h=10,d=5.5);
        for (seam=[0,90,180,270], sign=[-1,1])
            translate([75*cos(seam+sign*delta),75*sin(seam+sign*delta),-5])
                cylinder(h=10,d=5.5);
    }
}

module rocket_clamp_half_corrected() {
    clamp_id=77; clamp_od=108; clamp_h=20;
    difference() {
        union() {
            intersection() {
                difference() {
                    cylinder(h=clamp_h,d=clamp_od,center=true);
                    cylinder(h=clamp_h+2,d=clamp_id,center=true);
                }
                translate([-clamp_od,-0.01,-clamp_h]) cube([2*clamp_od,clamp_od,2*clamp_h]);
            }
            for (x=[-60,60]) translate([x,9,0]) cube([18,18,20],center=true);
        }
        // Fixed: centered at y=9 so the hole crosses the complete ear.
        for (x=[-60,60]) translate([x,9,0]) rotate([90,0,0]) cylinder(h=22,d=5.4,center=true);
        for (a=[45,135])
            translate([46.25*cos(a),46.25*sin(a),-11]) cylinder(h=22,d=5.4);
    }
}

module inner_axis_shaft_spacer_21_5mm() {
    difference() {
        cylinder(h=21.5,d=14,center=true);
        cylinder(h=23.5,d=8.2,center=true);
    }
}

part = "inner_axis_bearing_pedestal_base";

if (part == "inner_axis_bearing_pedestal_base") inner_axis_bearing_pedestal_base();
if (part == "inner_axis_bearing_pedestal_cap") inner_axis_bearing_pedestal_cap();
if (part == "inner_ring_clamp_carrier_plate") inner_ring_clamp_carrier_plate();
if (part == "rocket_clamp_half_corrected") rocket_clamp_half_corrected();
if (part == "inner_axis_shaft_spacer_21_5mm") inner_axis_shaft_spacer_21_5mm();
